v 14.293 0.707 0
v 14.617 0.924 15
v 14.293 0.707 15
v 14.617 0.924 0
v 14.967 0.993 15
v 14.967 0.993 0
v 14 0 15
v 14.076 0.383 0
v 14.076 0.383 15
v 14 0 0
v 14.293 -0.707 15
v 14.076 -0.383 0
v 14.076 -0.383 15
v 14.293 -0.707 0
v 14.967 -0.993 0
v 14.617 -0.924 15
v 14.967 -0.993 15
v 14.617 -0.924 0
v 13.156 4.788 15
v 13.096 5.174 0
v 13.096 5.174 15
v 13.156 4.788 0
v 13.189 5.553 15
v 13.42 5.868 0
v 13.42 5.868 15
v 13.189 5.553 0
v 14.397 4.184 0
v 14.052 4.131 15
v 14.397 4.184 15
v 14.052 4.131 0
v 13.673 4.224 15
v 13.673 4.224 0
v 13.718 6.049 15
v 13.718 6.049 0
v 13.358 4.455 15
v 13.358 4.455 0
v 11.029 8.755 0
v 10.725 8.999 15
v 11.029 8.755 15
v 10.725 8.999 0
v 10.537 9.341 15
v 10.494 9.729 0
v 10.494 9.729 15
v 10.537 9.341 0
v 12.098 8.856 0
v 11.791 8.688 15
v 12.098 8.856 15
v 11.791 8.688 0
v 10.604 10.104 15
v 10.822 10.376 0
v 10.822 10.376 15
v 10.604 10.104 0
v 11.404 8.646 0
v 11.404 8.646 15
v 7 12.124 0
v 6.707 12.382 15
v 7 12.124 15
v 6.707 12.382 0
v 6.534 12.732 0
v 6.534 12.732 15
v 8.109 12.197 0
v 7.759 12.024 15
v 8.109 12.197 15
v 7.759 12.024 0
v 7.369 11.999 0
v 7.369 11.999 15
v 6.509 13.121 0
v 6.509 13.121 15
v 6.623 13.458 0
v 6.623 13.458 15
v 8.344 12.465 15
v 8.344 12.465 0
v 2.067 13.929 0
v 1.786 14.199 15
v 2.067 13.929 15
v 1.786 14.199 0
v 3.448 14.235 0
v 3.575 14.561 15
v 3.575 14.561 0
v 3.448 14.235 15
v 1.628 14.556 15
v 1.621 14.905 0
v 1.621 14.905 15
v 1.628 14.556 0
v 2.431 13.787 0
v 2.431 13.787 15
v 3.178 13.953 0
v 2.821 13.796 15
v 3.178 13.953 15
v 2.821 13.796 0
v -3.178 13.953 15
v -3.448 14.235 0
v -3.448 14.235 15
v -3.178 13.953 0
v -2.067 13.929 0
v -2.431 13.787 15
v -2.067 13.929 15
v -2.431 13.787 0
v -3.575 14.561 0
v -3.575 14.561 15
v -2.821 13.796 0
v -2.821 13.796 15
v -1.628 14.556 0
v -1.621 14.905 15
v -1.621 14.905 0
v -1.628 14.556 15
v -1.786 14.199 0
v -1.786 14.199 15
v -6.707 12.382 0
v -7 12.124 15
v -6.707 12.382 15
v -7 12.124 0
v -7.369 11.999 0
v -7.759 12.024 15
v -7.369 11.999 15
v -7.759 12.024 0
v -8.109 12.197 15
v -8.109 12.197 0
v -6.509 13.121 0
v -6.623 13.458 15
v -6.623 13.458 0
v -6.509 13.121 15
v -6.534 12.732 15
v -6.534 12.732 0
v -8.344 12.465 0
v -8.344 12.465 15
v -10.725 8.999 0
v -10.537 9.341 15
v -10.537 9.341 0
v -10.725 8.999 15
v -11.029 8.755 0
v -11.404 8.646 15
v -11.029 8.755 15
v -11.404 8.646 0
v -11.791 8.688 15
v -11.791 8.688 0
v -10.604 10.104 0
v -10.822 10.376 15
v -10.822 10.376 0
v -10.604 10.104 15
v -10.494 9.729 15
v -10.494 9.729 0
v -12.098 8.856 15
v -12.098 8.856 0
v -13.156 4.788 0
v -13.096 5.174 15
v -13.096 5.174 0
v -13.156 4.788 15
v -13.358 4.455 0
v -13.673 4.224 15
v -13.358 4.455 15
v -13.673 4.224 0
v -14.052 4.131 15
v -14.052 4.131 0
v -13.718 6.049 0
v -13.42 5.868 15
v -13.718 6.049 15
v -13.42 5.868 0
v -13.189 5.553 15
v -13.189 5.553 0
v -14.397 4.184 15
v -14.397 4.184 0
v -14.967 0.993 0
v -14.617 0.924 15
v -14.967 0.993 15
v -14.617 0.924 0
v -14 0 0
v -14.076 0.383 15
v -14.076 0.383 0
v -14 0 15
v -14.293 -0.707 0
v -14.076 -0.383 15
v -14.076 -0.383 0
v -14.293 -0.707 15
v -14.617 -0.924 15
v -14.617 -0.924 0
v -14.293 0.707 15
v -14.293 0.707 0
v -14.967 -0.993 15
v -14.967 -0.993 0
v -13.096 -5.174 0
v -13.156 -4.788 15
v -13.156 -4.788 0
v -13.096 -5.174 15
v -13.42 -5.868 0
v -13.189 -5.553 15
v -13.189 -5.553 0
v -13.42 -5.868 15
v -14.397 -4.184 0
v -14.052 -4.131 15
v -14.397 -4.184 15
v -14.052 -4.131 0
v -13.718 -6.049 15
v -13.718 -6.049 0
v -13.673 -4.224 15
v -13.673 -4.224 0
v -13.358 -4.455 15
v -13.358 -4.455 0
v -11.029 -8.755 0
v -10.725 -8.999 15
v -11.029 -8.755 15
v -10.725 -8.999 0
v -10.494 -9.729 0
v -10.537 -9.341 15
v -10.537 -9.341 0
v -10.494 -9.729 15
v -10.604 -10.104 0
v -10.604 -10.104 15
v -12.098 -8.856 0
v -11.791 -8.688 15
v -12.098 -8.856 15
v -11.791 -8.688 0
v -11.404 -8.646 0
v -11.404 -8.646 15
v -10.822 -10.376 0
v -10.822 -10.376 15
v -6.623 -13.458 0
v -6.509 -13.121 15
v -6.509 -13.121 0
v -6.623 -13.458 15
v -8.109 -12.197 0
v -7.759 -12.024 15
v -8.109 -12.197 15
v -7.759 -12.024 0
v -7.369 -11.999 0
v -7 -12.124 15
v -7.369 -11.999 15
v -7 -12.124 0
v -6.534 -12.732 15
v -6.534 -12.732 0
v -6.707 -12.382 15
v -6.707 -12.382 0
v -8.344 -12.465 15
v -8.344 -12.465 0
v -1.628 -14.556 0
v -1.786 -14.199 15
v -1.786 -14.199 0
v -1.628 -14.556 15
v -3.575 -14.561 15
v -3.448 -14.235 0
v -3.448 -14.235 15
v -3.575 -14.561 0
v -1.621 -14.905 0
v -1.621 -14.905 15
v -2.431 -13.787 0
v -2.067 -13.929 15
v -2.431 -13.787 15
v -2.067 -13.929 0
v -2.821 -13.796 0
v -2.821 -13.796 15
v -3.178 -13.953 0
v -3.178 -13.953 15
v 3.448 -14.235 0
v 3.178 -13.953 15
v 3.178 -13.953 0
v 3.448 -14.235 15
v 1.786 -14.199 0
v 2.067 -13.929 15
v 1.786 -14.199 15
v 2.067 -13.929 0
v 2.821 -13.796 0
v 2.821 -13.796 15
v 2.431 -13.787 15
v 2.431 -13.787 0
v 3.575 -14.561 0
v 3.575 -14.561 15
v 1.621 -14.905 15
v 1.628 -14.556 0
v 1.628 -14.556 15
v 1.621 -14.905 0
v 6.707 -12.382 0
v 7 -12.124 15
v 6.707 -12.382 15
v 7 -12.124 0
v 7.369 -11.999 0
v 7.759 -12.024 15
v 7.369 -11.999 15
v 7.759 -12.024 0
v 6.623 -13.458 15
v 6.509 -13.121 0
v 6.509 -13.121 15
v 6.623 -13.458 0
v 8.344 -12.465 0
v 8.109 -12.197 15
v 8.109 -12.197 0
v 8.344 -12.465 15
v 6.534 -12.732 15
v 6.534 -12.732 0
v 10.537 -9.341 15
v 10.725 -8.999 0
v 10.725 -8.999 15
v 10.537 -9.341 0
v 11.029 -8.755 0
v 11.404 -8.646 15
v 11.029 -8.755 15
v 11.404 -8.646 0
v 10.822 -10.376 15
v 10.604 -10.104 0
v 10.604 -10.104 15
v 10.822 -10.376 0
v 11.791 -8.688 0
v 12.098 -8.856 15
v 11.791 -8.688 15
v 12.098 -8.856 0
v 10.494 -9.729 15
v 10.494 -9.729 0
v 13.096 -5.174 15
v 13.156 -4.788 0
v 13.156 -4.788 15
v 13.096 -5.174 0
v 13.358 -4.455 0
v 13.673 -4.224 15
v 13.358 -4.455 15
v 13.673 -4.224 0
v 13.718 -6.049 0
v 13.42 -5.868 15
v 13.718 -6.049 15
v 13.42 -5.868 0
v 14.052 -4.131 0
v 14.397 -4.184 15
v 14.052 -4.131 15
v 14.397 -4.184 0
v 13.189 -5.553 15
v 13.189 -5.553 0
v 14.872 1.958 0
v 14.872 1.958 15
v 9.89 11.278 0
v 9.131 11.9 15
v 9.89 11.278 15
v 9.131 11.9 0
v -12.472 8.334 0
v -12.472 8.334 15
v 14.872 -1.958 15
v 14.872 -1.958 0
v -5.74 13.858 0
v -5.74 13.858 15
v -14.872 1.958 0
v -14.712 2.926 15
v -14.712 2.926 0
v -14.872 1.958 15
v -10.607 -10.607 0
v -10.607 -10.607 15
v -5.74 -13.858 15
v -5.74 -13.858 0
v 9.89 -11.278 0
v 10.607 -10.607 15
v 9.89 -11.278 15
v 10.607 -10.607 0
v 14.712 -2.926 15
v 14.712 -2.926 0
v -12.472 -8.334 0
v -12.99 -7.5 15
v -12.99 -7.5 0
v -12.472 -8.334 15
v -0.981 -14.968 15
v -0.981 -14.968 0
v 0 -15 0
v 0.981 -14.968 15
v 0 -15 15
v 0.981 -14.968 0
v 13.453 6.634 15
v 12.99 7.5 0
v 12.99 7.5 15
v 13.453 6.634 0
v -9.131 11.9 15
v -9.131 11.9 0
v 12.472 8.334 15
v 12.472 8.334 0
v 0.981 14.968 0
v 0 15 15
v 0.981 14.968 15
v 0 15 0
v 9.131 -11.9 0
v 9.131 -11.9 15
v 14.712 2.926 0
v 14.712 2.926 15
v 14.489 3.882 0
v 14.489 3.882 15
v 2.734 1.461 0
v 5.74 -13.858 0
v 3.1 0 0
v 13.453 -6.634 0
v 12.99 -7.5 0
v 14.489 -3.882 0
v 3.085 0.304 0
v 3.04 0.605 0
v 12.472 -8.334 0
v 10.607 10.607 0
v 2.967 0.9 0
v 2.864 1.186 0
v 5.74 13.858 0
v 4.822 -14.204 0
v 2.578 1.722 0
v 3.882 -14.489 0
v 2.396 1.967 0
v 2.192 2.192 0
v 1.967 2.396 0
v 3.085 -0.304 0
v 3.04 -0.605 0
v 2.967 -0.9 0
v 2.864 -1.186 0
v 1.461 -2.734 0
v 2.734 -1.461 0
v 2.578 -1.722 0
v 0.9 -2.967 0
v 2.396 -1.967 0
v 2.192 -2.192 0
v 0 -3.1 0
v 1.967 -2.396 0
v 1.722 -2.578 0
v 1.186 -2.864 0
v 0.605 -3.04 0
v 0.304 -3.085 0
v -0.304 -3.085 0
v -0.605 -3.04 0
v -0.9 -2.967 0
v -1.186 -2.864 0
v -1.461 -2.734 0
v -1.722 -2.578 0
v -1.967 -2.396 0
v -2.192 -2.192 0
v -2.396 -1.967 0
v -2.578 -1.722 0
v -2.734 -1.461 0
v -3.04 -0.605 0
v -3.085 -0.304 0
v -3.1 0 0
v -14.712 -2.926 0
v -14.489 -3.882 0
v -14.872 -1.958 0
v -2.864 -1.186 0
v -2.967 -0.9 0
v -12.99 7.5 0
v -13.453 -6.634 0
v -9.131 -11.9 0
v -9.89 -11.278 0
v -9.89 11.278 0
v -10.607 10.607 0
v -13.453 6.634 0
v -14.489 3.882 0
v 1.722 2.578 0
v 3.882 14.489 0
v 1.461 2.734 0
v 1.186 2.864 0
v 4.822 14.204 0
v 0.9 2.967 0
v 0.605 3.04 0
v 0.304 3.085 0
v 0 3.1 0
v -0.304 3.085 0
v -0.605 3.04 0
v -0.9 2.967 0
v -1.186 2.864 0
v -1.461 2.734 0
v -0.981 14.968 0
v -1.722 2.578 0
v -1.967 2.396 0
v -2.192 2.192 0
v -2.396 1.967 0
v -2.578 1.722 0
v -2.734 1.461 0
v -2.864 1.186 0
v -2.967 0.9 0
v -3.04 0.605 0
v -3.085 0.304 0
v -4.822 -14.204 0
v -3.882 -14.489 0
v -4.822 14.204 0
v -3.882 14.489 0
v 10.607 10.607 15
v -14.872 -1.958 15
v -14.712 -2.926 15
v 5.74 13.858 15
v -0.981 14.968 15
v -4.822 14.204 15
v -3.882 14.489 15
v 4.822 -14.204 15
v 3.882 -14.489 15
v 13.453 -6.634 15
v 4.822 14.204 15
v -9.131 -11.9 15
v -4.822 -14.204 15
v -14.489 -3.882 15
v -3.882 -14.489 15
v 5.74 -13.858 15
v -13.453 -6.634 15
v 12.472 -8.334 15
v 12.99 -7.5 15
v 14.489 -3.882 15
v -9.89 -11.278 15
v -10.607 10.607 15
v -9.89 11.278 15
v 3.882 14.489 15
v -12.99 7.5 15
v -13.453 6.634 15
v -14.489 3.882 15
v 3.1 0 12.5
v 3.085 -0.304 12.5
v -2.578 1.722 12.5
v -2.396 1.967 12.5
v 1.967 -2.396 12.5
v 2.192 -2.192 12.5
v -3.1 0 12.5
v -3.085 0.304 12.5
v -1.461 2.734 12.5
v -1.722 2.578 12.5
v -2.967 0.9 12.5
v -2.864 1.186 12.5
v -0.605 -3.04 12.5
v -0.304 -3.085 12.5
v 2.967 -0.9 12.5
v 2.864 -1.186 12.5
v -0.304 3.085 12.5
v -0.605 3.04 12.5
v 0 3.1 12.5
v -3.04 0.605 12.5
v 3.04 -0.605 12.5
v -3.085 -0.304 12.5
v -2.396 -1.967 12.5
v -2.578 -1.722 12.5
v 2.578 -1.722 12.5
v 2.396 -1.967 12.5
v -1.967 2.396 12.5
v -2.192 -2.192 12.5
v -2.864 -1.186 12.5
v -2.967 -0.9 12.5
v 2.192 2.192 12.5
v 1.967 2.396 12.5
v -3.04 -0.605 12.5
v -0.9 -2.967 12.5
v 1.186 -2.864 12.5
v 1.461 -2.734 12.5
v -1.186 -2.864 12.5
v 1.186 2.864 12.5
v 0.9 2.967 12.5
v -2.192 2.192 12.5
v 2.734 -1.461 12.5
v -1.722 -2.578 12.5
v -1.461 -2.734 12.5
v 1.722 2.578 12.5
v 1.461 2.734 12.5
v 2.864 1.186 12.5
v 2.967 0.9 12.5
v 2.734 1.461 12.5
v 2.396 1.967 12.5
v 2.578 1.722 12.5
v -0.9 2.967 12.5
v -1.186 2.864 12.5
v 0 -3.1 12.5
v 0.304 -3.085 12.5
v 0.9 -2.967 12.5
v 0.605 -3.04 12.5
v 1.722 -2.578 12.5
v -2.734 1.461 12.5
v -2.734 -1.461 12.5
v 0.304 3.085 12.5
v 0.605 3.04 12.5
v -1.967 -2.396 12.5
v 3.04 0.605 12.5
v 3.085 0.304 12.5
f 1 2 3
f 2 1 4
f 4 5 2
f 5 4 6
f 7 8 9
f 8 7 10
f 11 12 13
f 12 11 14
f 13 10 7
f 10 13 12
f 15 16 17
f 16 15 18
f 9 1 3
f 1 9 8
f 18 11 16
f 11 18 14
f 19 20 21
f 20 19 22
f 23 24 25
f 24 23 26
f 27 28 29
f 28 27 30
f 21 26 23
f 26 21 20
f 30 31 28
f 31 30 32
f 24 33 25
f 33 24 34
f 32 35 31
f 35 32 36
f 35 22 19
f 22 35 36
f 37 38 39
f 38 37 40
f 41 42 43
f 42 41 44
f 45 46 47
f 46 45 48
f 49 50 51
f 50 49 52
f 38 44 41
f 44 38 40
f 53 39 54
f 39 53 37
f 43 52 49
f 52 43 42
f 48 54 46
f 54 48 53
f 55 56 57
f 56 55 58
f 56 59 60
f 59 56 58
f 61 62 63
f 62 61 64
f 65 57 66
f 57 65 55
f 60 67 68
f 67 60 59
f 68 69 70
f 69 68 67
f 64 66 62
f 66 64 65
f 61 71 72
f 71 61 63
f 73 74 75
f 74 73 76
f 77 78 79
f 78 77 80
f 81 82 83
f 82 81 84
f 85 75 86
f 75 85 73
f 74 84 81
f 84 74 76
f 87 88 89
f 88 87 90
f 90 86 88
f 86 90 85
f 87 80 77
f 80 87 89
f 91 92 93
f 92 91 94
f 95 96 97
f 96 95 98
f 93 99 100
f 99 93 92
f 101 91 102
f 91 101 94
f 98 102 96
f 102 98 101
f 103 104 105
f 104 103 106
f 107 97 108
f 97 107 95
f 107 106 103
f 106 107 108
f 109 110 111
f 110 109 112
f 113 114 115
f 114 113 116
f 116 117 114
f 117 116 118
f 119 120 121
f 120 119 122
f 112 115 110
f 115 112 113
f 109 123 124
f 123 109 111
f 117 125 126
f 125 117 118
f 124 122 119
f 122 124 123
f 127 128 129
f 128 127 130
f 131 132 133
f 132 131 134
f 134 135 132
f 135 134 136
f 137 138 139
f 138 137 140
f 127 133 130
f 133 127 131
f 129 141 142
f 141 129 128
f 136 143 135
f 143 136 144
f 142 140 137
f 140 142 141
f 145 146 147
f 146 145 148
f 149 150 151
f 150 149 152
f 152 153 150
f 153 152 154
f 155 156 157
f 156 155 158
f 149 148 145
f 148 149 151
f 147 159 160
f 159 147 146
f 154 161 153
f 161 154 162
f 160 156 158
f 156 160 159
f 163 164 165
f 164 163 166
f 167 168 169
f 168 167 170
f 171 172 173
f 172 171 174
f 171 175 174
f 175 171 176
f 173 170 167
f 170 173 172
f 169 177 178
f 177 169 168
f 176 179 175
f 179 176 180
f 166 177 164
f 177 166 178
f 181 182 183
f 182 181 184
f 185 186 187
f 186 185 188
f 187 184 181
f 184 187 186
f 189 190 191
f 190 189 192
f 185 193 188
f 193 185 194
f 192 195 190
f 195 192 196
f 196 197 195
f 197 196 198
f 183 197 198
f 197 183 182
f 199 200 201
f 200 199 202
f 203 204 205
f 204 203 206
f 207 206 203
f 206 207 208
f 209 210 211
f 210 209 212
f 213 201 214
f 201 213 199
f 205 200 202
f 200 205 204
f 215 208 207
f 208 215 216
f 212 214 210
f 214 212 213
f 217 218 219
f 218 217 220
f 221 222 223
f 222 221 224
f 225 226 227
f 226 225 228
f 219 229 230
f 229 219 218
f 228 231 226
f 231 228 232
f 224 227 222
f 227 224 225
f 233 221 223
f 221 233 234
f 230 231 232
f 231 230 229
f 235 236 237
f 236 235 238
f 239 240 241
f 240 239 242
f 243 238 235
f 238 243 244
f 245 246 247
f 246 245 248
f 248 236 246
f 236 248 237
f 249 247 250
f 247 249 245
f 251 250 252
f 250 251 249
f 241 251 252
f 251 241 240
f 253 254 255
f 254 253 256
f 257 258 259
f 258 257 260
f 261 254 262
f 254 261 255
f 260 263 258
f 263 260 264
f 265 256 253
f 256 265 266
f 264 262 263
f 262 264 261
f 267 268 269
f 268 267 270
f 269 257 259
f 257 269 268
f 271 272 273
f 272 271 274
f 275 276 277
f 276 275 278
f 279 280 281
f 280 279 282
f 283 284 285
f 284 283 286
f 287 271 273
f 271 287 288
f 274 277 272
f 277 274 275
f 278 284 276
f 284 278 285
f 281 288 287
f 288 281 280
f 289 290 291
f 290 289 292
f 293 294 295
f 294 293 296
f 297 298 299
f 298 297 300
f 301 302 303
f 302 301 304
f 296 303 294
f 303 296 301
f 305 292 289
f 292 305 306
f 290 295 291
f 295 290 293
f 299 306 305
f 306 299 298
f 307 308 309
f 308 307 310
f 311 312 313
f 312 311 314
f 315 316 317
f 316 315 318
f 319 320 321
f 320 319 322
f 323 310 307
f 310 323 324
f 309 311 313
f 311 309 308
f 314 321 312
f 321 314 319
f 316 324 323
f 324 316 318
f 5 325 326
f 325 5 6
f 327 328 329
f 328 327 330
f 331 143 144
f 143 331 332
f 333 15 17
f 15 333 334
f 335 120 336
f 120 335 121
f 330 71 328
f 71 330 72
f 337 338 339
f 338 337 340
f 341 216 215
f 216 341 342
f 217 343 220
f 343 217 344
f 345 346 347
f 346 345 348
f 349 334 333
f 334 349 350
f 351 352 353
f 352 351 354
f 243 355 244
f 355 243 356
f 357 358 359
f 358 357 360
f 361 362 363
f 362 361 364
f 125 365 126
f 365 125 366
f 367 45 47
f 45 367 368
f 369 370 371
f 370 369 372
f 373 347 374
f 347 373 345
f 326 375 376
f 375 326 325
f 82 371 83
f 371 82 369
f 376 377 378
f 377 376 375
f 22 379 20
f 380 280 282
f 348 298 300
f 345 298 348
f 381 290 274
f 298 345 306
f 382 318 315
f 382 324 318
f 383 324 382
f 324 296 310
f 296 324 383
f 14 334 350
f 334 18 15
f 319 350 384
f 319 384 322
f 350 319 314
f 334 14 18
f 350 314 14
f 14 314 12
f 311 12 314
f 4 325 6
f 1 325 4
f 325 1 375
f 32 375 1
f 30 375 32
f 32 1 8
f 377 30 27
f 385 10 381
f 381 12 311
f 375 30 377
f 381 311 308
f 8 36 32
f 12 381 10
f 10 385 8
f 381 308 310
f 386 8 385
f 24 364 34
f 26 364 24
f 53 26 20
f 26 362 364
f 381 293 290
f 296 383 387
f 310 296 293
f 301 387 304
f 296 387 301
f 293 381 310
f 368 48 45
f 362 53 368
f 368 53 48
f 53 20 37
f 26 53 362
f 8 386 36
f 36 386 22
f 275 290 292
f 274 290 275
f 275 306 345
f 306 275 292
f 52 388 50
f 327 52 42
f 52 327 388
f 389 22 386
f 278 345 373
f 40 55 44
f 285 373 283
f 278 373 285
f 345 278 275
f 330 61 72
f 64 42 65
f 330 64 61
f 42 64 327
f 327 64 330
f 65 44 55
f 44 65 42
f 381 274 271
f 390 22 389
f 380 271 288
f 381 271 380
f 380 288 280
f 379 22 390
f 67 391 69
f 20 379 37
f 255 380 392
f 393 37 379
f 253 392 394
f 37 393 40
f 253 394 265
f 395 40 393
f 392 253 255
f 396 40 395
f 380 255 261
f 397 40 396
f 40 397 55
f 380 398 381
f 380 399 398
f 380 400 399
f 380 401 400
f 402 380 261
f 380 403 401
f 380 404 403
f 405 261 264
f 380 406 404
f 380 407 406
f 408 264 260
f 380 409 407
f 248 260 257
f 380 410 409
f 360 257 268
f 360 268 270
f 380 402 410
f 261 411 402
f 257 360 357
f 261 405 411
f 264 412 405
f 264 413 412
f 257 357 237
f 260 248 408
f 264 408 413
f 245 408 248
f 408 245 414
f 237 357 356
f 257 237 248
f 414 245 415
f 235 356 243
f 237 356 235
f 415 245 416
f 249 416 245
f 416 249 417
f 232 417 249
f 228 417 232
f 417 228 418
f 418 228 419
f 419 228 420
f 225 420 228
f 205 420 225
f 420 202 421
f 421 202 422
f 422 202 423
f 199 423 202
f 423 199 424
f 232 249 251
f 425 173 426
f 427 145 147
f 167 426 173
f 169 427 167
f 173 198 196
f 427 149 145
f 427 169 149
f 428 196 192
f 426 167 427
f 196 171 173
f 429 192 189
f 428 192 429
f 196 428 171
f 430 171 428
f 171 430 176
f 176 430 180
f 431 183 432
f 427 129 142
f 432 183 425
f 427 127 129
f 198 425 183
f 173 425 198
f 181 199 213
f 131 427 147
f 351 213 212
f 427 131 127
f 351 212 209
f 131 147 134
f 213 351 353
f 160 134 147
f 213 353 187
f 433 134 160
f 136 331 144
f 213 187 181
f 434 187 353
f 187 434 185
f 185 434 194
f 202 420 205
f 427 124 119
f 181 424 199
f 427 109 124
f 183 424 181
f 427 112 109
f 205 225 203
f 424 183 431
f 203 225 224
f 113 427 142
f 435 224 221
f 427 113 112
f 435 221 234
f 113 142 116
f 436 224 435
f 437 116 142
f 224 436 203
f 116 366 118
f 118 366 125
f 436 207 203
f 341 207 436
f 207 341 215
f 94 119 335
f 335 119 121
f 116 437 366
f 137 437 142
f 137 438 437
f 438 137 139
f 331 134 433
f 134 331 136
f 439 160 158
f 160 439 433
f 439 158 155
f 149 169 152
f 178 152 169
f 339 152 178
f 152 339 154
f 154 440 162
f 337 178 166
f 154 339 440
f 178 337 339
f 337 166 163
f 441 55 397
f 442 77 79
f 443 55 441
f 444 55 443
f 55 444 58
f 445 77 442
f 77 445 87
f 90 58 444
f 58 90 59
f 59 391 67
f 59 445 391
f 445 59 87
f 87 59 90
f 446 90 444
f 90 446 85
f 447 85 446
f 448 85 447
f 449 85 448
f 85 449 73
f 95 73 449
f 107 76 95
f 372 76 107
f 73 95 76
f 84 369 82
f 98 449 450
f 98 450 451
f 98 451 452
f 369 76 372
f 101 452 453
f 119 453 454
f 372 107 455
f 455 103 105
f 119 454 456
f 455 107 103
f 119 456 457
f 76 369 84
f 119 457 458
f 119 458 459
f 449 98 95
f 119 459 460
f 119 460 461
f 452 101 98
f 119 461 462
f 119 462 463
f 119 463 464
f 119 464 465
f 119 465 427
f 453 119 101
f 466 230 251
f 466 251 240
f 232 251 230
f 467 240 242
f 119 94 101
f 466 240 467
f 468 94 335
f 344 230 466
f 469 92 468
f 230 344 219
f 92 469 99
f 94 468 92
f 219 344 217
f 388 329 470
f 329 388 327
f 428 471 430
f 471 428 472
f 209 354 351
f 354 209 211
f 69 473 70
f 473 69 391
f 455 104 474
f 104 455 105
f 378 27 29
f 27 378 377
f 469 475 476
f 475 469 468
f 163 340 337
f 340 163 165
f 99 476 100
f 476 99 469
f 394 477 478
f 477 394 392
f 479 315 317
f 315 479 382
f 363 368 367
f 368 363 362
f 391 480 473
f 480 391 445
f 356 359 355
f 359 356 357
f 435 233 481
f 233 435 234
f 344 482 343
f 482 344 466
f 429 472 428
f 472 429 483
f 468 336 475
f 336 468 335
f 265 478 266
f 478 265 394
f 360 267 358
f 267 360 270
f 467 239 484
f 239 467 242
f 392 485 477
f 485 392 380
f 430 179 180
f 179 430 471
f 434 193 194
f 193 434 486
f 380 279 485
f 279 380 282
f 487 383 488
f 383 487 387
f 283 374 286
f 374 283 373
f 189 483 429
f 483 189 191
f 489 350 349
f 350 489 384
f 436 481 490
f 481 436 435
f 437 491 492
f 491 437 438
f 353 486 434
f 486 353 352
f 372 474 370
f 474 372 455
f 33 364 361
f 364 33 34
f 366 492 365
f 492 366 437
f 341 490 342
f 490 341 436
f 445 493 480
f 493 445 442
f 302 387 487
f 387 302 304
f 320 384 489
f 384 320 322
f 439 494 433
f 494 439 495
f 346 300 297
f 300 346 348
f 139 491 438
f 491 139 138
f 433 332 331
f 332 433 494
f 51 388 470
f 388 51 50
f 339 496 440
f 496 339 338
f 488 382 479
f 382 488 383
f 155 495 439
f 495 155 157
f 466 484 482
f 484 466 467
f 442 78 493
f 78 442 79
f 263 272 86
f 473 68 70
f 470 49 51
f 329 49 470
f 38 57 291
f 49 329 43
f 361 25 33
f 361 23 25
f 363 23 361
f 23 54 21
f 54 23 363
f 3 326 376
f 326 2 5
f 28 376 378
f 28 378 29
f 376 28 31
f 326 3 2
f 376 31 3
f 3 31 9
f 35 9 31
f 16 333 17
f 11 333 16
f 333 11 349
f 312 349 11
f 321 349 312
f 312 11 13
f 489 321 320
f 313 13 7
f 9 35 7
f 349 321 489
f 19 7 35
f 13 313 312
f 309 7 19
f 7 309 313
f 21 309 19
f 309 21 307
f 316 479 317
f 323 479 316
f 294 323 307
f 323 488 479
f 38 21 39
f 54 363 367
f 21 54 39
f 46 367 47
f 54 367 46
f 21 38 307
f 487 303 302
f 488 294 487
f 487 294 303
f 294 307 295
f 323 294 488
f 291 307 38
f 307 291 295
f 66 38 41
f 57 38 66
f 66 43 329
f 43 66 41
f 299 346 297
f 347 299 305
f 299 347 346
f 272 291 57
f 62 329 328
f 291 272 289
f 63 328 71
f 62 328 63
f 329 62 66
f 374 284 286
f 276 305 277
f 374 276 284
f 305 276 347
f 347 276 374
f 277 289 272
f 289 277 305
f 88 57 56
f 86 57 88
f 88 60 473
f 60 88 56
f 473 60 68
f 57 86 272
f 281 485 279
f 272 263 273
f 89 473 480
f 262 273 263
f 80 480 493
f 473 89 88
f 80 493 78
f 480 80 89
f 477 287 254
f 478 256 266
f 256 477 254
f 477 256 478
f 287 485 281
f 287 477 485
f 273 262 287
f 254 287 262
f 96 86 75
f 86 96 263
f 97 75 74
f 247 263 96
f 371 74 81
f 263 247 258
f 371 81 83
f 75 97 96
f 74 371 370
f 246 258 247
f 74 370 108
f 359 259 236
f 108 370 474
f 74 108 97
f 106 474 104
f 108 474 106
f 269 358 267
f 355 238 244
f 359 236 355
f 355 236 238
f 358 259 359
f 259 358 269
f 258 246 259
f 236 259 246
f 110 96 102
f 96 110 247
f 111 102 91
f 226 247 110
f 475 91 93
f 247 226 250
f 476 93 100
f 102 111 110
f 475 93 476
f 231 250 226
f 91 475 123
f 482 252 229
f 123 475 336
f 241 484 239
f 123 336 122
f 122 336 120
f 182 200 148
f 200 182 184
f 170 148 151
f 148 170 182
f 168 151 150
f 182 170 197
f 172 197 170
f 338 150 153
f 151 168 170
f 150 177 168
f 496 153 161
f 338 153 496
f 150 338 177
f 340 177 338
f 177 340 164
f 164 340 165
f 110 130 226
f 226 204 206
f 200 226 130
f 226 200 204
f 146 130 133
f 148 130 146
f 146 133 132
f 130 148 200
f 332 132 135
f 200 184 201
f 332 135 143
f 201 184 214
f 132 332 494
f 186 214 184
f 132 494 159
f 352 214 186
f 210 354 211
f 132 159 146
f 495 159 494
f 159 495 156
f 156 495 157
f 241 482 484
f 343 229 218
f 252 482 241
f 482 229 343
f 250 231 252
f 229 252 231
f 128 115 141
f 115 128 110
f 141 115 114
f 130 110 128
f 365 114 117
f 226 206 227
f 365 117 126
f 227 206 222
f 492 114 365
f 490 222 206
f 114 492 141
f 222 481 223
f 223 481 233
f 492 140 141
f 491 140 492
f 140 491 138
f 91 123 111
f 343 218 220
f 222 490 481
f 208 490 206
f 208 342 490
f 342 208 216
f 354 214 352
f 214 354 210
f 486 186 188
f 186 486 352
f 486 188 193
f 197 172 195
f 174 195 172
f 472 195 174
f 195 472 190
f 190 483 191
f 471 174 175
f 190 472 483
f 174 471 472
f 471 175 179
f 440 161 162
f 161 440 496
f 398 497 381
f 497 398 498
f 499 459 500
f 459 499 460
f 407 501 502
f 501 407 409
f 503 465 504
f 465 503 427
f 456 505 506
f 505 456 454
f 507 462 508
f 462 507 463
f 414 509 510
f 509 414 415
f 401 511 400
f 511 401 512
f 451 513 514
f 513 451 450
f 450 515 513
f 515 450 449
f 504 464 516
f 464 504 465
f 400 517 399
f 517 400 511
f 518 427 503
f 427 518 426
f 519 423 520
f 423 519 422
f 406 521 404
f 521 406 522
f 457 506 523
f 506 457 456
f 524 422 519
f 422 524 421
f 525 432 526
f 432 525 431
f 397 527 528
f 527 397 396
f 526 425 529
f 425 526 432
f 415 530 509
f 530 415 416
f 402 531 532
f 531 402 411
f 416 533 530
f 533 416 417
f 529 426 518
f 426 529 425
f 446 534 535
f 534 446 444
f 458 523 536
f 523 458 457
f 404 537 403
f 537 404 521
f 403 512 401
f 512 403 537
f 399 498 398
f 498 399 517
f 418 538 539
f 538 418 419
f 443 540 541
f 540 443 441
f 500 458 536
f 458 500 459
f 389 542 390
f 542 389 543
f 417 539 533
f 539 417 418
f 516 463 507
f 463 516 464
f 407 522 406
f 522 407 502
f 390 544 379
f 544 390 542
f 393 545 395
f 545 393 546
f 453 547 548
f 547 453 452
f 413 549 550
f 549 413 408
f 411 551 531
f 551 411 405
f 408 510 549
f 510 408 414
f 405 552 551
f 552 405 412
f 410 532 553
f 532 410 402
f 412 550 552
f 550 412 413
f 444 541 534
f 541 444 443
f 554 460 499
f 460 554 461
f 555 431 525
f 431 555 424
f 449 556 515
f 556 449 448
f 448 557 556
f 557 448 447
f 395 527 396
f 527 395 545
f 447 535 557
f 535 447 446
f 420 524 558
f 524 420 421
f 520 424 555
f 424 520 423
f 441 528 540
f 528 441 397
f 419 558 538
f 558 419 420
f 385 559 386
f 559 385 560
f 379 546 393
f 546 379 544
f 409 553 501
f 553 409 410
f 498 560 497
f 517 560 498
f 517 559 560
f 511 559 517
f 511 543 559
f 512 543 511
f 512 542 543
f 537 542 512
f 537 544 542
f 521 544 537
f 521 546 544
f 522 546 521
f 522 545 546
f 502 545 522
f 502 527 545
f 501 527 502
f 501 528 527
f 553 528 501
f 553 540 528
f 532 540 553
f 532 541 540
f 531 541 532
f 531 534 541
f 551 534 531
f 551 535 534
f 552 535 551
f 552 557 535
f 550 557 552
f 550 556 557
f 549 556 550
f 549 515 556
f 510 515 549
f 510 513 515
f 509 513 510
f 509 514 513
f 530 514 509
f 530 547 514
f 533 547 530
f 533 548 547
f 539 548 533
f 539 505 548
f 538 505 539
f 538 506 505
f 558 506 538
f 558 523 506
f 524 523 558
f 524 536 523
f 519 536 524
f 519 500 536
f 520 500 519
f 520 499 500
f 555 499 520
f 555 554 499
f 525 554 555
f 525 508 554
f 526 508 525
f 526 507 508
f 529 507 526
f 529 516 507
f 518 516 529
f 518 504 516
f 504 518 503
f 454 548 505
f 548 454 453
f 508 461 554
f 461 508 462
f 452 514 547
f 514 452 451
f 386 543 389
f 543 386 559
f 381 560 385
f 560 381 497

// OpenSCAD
// Replacement knob for hotplate stirrer with D-shaft
// Print orientation: side facing hotplate down on bed (z = 0)

// ---------------- Parameters ----------------
knob_d          = 30;    // knob outer diameter
knob_h          = 15;    // knob height
shaft_d         = 6;     // D-shaft diameter
bore_depth      = 12;    // blind bore depth from bottom face
bore_flat       = 4.7;   // distance from D-bore flat to opposite side
bore_r          = 3.1;   // bore radius (6.2 mm / 2)
groove_count    = 18;    // number of vertical grip grooves
groove_d        = 2;     // groove diameter (half-cylinder)
pointer_width   = 1.5;   // pointer groove width
pointer_depth   = 1;     // pointer groove depth
eps             = 0.5;   // overcut for clean differences

$fn = 96;

// ---------------- Model ----------------
difference() {
    // Main cylinder
    translate([0, 0, 0])
        cylinder(d = knob_d, h = knob_h);

    // D-shaped blind bore from bottom face
    translate([0, 0, -eps])
        linear_extrude(height = bore_depth + 2 * eps)
            circle(r = bore_r, $fn = 64);   // circle with one side cut flat

    // Vertical grip grooves along full height, centred on outer surface
    for (i = [0 : groove_count - 1]) {
        rotate([0, 0, i * 360 / groove_count])
            translate([knob_d / 2, 0, -eps])
                cylinder(d = groove_d, h = knob_h + 2 * eps, $fn = 16);
    }

    // Pointer groove on top face, from centre to outer edge
    // (placed on the same side as the flat of the D-bore)
    translate([0, 0, knob_h - pointer_depth])
        linear_extrude(height = pointer_depth + eps)
            translate([-knob_d / 2, -pointer_width / 2, 0])
                cube([knob_d, pointer_width, eps]);
}
